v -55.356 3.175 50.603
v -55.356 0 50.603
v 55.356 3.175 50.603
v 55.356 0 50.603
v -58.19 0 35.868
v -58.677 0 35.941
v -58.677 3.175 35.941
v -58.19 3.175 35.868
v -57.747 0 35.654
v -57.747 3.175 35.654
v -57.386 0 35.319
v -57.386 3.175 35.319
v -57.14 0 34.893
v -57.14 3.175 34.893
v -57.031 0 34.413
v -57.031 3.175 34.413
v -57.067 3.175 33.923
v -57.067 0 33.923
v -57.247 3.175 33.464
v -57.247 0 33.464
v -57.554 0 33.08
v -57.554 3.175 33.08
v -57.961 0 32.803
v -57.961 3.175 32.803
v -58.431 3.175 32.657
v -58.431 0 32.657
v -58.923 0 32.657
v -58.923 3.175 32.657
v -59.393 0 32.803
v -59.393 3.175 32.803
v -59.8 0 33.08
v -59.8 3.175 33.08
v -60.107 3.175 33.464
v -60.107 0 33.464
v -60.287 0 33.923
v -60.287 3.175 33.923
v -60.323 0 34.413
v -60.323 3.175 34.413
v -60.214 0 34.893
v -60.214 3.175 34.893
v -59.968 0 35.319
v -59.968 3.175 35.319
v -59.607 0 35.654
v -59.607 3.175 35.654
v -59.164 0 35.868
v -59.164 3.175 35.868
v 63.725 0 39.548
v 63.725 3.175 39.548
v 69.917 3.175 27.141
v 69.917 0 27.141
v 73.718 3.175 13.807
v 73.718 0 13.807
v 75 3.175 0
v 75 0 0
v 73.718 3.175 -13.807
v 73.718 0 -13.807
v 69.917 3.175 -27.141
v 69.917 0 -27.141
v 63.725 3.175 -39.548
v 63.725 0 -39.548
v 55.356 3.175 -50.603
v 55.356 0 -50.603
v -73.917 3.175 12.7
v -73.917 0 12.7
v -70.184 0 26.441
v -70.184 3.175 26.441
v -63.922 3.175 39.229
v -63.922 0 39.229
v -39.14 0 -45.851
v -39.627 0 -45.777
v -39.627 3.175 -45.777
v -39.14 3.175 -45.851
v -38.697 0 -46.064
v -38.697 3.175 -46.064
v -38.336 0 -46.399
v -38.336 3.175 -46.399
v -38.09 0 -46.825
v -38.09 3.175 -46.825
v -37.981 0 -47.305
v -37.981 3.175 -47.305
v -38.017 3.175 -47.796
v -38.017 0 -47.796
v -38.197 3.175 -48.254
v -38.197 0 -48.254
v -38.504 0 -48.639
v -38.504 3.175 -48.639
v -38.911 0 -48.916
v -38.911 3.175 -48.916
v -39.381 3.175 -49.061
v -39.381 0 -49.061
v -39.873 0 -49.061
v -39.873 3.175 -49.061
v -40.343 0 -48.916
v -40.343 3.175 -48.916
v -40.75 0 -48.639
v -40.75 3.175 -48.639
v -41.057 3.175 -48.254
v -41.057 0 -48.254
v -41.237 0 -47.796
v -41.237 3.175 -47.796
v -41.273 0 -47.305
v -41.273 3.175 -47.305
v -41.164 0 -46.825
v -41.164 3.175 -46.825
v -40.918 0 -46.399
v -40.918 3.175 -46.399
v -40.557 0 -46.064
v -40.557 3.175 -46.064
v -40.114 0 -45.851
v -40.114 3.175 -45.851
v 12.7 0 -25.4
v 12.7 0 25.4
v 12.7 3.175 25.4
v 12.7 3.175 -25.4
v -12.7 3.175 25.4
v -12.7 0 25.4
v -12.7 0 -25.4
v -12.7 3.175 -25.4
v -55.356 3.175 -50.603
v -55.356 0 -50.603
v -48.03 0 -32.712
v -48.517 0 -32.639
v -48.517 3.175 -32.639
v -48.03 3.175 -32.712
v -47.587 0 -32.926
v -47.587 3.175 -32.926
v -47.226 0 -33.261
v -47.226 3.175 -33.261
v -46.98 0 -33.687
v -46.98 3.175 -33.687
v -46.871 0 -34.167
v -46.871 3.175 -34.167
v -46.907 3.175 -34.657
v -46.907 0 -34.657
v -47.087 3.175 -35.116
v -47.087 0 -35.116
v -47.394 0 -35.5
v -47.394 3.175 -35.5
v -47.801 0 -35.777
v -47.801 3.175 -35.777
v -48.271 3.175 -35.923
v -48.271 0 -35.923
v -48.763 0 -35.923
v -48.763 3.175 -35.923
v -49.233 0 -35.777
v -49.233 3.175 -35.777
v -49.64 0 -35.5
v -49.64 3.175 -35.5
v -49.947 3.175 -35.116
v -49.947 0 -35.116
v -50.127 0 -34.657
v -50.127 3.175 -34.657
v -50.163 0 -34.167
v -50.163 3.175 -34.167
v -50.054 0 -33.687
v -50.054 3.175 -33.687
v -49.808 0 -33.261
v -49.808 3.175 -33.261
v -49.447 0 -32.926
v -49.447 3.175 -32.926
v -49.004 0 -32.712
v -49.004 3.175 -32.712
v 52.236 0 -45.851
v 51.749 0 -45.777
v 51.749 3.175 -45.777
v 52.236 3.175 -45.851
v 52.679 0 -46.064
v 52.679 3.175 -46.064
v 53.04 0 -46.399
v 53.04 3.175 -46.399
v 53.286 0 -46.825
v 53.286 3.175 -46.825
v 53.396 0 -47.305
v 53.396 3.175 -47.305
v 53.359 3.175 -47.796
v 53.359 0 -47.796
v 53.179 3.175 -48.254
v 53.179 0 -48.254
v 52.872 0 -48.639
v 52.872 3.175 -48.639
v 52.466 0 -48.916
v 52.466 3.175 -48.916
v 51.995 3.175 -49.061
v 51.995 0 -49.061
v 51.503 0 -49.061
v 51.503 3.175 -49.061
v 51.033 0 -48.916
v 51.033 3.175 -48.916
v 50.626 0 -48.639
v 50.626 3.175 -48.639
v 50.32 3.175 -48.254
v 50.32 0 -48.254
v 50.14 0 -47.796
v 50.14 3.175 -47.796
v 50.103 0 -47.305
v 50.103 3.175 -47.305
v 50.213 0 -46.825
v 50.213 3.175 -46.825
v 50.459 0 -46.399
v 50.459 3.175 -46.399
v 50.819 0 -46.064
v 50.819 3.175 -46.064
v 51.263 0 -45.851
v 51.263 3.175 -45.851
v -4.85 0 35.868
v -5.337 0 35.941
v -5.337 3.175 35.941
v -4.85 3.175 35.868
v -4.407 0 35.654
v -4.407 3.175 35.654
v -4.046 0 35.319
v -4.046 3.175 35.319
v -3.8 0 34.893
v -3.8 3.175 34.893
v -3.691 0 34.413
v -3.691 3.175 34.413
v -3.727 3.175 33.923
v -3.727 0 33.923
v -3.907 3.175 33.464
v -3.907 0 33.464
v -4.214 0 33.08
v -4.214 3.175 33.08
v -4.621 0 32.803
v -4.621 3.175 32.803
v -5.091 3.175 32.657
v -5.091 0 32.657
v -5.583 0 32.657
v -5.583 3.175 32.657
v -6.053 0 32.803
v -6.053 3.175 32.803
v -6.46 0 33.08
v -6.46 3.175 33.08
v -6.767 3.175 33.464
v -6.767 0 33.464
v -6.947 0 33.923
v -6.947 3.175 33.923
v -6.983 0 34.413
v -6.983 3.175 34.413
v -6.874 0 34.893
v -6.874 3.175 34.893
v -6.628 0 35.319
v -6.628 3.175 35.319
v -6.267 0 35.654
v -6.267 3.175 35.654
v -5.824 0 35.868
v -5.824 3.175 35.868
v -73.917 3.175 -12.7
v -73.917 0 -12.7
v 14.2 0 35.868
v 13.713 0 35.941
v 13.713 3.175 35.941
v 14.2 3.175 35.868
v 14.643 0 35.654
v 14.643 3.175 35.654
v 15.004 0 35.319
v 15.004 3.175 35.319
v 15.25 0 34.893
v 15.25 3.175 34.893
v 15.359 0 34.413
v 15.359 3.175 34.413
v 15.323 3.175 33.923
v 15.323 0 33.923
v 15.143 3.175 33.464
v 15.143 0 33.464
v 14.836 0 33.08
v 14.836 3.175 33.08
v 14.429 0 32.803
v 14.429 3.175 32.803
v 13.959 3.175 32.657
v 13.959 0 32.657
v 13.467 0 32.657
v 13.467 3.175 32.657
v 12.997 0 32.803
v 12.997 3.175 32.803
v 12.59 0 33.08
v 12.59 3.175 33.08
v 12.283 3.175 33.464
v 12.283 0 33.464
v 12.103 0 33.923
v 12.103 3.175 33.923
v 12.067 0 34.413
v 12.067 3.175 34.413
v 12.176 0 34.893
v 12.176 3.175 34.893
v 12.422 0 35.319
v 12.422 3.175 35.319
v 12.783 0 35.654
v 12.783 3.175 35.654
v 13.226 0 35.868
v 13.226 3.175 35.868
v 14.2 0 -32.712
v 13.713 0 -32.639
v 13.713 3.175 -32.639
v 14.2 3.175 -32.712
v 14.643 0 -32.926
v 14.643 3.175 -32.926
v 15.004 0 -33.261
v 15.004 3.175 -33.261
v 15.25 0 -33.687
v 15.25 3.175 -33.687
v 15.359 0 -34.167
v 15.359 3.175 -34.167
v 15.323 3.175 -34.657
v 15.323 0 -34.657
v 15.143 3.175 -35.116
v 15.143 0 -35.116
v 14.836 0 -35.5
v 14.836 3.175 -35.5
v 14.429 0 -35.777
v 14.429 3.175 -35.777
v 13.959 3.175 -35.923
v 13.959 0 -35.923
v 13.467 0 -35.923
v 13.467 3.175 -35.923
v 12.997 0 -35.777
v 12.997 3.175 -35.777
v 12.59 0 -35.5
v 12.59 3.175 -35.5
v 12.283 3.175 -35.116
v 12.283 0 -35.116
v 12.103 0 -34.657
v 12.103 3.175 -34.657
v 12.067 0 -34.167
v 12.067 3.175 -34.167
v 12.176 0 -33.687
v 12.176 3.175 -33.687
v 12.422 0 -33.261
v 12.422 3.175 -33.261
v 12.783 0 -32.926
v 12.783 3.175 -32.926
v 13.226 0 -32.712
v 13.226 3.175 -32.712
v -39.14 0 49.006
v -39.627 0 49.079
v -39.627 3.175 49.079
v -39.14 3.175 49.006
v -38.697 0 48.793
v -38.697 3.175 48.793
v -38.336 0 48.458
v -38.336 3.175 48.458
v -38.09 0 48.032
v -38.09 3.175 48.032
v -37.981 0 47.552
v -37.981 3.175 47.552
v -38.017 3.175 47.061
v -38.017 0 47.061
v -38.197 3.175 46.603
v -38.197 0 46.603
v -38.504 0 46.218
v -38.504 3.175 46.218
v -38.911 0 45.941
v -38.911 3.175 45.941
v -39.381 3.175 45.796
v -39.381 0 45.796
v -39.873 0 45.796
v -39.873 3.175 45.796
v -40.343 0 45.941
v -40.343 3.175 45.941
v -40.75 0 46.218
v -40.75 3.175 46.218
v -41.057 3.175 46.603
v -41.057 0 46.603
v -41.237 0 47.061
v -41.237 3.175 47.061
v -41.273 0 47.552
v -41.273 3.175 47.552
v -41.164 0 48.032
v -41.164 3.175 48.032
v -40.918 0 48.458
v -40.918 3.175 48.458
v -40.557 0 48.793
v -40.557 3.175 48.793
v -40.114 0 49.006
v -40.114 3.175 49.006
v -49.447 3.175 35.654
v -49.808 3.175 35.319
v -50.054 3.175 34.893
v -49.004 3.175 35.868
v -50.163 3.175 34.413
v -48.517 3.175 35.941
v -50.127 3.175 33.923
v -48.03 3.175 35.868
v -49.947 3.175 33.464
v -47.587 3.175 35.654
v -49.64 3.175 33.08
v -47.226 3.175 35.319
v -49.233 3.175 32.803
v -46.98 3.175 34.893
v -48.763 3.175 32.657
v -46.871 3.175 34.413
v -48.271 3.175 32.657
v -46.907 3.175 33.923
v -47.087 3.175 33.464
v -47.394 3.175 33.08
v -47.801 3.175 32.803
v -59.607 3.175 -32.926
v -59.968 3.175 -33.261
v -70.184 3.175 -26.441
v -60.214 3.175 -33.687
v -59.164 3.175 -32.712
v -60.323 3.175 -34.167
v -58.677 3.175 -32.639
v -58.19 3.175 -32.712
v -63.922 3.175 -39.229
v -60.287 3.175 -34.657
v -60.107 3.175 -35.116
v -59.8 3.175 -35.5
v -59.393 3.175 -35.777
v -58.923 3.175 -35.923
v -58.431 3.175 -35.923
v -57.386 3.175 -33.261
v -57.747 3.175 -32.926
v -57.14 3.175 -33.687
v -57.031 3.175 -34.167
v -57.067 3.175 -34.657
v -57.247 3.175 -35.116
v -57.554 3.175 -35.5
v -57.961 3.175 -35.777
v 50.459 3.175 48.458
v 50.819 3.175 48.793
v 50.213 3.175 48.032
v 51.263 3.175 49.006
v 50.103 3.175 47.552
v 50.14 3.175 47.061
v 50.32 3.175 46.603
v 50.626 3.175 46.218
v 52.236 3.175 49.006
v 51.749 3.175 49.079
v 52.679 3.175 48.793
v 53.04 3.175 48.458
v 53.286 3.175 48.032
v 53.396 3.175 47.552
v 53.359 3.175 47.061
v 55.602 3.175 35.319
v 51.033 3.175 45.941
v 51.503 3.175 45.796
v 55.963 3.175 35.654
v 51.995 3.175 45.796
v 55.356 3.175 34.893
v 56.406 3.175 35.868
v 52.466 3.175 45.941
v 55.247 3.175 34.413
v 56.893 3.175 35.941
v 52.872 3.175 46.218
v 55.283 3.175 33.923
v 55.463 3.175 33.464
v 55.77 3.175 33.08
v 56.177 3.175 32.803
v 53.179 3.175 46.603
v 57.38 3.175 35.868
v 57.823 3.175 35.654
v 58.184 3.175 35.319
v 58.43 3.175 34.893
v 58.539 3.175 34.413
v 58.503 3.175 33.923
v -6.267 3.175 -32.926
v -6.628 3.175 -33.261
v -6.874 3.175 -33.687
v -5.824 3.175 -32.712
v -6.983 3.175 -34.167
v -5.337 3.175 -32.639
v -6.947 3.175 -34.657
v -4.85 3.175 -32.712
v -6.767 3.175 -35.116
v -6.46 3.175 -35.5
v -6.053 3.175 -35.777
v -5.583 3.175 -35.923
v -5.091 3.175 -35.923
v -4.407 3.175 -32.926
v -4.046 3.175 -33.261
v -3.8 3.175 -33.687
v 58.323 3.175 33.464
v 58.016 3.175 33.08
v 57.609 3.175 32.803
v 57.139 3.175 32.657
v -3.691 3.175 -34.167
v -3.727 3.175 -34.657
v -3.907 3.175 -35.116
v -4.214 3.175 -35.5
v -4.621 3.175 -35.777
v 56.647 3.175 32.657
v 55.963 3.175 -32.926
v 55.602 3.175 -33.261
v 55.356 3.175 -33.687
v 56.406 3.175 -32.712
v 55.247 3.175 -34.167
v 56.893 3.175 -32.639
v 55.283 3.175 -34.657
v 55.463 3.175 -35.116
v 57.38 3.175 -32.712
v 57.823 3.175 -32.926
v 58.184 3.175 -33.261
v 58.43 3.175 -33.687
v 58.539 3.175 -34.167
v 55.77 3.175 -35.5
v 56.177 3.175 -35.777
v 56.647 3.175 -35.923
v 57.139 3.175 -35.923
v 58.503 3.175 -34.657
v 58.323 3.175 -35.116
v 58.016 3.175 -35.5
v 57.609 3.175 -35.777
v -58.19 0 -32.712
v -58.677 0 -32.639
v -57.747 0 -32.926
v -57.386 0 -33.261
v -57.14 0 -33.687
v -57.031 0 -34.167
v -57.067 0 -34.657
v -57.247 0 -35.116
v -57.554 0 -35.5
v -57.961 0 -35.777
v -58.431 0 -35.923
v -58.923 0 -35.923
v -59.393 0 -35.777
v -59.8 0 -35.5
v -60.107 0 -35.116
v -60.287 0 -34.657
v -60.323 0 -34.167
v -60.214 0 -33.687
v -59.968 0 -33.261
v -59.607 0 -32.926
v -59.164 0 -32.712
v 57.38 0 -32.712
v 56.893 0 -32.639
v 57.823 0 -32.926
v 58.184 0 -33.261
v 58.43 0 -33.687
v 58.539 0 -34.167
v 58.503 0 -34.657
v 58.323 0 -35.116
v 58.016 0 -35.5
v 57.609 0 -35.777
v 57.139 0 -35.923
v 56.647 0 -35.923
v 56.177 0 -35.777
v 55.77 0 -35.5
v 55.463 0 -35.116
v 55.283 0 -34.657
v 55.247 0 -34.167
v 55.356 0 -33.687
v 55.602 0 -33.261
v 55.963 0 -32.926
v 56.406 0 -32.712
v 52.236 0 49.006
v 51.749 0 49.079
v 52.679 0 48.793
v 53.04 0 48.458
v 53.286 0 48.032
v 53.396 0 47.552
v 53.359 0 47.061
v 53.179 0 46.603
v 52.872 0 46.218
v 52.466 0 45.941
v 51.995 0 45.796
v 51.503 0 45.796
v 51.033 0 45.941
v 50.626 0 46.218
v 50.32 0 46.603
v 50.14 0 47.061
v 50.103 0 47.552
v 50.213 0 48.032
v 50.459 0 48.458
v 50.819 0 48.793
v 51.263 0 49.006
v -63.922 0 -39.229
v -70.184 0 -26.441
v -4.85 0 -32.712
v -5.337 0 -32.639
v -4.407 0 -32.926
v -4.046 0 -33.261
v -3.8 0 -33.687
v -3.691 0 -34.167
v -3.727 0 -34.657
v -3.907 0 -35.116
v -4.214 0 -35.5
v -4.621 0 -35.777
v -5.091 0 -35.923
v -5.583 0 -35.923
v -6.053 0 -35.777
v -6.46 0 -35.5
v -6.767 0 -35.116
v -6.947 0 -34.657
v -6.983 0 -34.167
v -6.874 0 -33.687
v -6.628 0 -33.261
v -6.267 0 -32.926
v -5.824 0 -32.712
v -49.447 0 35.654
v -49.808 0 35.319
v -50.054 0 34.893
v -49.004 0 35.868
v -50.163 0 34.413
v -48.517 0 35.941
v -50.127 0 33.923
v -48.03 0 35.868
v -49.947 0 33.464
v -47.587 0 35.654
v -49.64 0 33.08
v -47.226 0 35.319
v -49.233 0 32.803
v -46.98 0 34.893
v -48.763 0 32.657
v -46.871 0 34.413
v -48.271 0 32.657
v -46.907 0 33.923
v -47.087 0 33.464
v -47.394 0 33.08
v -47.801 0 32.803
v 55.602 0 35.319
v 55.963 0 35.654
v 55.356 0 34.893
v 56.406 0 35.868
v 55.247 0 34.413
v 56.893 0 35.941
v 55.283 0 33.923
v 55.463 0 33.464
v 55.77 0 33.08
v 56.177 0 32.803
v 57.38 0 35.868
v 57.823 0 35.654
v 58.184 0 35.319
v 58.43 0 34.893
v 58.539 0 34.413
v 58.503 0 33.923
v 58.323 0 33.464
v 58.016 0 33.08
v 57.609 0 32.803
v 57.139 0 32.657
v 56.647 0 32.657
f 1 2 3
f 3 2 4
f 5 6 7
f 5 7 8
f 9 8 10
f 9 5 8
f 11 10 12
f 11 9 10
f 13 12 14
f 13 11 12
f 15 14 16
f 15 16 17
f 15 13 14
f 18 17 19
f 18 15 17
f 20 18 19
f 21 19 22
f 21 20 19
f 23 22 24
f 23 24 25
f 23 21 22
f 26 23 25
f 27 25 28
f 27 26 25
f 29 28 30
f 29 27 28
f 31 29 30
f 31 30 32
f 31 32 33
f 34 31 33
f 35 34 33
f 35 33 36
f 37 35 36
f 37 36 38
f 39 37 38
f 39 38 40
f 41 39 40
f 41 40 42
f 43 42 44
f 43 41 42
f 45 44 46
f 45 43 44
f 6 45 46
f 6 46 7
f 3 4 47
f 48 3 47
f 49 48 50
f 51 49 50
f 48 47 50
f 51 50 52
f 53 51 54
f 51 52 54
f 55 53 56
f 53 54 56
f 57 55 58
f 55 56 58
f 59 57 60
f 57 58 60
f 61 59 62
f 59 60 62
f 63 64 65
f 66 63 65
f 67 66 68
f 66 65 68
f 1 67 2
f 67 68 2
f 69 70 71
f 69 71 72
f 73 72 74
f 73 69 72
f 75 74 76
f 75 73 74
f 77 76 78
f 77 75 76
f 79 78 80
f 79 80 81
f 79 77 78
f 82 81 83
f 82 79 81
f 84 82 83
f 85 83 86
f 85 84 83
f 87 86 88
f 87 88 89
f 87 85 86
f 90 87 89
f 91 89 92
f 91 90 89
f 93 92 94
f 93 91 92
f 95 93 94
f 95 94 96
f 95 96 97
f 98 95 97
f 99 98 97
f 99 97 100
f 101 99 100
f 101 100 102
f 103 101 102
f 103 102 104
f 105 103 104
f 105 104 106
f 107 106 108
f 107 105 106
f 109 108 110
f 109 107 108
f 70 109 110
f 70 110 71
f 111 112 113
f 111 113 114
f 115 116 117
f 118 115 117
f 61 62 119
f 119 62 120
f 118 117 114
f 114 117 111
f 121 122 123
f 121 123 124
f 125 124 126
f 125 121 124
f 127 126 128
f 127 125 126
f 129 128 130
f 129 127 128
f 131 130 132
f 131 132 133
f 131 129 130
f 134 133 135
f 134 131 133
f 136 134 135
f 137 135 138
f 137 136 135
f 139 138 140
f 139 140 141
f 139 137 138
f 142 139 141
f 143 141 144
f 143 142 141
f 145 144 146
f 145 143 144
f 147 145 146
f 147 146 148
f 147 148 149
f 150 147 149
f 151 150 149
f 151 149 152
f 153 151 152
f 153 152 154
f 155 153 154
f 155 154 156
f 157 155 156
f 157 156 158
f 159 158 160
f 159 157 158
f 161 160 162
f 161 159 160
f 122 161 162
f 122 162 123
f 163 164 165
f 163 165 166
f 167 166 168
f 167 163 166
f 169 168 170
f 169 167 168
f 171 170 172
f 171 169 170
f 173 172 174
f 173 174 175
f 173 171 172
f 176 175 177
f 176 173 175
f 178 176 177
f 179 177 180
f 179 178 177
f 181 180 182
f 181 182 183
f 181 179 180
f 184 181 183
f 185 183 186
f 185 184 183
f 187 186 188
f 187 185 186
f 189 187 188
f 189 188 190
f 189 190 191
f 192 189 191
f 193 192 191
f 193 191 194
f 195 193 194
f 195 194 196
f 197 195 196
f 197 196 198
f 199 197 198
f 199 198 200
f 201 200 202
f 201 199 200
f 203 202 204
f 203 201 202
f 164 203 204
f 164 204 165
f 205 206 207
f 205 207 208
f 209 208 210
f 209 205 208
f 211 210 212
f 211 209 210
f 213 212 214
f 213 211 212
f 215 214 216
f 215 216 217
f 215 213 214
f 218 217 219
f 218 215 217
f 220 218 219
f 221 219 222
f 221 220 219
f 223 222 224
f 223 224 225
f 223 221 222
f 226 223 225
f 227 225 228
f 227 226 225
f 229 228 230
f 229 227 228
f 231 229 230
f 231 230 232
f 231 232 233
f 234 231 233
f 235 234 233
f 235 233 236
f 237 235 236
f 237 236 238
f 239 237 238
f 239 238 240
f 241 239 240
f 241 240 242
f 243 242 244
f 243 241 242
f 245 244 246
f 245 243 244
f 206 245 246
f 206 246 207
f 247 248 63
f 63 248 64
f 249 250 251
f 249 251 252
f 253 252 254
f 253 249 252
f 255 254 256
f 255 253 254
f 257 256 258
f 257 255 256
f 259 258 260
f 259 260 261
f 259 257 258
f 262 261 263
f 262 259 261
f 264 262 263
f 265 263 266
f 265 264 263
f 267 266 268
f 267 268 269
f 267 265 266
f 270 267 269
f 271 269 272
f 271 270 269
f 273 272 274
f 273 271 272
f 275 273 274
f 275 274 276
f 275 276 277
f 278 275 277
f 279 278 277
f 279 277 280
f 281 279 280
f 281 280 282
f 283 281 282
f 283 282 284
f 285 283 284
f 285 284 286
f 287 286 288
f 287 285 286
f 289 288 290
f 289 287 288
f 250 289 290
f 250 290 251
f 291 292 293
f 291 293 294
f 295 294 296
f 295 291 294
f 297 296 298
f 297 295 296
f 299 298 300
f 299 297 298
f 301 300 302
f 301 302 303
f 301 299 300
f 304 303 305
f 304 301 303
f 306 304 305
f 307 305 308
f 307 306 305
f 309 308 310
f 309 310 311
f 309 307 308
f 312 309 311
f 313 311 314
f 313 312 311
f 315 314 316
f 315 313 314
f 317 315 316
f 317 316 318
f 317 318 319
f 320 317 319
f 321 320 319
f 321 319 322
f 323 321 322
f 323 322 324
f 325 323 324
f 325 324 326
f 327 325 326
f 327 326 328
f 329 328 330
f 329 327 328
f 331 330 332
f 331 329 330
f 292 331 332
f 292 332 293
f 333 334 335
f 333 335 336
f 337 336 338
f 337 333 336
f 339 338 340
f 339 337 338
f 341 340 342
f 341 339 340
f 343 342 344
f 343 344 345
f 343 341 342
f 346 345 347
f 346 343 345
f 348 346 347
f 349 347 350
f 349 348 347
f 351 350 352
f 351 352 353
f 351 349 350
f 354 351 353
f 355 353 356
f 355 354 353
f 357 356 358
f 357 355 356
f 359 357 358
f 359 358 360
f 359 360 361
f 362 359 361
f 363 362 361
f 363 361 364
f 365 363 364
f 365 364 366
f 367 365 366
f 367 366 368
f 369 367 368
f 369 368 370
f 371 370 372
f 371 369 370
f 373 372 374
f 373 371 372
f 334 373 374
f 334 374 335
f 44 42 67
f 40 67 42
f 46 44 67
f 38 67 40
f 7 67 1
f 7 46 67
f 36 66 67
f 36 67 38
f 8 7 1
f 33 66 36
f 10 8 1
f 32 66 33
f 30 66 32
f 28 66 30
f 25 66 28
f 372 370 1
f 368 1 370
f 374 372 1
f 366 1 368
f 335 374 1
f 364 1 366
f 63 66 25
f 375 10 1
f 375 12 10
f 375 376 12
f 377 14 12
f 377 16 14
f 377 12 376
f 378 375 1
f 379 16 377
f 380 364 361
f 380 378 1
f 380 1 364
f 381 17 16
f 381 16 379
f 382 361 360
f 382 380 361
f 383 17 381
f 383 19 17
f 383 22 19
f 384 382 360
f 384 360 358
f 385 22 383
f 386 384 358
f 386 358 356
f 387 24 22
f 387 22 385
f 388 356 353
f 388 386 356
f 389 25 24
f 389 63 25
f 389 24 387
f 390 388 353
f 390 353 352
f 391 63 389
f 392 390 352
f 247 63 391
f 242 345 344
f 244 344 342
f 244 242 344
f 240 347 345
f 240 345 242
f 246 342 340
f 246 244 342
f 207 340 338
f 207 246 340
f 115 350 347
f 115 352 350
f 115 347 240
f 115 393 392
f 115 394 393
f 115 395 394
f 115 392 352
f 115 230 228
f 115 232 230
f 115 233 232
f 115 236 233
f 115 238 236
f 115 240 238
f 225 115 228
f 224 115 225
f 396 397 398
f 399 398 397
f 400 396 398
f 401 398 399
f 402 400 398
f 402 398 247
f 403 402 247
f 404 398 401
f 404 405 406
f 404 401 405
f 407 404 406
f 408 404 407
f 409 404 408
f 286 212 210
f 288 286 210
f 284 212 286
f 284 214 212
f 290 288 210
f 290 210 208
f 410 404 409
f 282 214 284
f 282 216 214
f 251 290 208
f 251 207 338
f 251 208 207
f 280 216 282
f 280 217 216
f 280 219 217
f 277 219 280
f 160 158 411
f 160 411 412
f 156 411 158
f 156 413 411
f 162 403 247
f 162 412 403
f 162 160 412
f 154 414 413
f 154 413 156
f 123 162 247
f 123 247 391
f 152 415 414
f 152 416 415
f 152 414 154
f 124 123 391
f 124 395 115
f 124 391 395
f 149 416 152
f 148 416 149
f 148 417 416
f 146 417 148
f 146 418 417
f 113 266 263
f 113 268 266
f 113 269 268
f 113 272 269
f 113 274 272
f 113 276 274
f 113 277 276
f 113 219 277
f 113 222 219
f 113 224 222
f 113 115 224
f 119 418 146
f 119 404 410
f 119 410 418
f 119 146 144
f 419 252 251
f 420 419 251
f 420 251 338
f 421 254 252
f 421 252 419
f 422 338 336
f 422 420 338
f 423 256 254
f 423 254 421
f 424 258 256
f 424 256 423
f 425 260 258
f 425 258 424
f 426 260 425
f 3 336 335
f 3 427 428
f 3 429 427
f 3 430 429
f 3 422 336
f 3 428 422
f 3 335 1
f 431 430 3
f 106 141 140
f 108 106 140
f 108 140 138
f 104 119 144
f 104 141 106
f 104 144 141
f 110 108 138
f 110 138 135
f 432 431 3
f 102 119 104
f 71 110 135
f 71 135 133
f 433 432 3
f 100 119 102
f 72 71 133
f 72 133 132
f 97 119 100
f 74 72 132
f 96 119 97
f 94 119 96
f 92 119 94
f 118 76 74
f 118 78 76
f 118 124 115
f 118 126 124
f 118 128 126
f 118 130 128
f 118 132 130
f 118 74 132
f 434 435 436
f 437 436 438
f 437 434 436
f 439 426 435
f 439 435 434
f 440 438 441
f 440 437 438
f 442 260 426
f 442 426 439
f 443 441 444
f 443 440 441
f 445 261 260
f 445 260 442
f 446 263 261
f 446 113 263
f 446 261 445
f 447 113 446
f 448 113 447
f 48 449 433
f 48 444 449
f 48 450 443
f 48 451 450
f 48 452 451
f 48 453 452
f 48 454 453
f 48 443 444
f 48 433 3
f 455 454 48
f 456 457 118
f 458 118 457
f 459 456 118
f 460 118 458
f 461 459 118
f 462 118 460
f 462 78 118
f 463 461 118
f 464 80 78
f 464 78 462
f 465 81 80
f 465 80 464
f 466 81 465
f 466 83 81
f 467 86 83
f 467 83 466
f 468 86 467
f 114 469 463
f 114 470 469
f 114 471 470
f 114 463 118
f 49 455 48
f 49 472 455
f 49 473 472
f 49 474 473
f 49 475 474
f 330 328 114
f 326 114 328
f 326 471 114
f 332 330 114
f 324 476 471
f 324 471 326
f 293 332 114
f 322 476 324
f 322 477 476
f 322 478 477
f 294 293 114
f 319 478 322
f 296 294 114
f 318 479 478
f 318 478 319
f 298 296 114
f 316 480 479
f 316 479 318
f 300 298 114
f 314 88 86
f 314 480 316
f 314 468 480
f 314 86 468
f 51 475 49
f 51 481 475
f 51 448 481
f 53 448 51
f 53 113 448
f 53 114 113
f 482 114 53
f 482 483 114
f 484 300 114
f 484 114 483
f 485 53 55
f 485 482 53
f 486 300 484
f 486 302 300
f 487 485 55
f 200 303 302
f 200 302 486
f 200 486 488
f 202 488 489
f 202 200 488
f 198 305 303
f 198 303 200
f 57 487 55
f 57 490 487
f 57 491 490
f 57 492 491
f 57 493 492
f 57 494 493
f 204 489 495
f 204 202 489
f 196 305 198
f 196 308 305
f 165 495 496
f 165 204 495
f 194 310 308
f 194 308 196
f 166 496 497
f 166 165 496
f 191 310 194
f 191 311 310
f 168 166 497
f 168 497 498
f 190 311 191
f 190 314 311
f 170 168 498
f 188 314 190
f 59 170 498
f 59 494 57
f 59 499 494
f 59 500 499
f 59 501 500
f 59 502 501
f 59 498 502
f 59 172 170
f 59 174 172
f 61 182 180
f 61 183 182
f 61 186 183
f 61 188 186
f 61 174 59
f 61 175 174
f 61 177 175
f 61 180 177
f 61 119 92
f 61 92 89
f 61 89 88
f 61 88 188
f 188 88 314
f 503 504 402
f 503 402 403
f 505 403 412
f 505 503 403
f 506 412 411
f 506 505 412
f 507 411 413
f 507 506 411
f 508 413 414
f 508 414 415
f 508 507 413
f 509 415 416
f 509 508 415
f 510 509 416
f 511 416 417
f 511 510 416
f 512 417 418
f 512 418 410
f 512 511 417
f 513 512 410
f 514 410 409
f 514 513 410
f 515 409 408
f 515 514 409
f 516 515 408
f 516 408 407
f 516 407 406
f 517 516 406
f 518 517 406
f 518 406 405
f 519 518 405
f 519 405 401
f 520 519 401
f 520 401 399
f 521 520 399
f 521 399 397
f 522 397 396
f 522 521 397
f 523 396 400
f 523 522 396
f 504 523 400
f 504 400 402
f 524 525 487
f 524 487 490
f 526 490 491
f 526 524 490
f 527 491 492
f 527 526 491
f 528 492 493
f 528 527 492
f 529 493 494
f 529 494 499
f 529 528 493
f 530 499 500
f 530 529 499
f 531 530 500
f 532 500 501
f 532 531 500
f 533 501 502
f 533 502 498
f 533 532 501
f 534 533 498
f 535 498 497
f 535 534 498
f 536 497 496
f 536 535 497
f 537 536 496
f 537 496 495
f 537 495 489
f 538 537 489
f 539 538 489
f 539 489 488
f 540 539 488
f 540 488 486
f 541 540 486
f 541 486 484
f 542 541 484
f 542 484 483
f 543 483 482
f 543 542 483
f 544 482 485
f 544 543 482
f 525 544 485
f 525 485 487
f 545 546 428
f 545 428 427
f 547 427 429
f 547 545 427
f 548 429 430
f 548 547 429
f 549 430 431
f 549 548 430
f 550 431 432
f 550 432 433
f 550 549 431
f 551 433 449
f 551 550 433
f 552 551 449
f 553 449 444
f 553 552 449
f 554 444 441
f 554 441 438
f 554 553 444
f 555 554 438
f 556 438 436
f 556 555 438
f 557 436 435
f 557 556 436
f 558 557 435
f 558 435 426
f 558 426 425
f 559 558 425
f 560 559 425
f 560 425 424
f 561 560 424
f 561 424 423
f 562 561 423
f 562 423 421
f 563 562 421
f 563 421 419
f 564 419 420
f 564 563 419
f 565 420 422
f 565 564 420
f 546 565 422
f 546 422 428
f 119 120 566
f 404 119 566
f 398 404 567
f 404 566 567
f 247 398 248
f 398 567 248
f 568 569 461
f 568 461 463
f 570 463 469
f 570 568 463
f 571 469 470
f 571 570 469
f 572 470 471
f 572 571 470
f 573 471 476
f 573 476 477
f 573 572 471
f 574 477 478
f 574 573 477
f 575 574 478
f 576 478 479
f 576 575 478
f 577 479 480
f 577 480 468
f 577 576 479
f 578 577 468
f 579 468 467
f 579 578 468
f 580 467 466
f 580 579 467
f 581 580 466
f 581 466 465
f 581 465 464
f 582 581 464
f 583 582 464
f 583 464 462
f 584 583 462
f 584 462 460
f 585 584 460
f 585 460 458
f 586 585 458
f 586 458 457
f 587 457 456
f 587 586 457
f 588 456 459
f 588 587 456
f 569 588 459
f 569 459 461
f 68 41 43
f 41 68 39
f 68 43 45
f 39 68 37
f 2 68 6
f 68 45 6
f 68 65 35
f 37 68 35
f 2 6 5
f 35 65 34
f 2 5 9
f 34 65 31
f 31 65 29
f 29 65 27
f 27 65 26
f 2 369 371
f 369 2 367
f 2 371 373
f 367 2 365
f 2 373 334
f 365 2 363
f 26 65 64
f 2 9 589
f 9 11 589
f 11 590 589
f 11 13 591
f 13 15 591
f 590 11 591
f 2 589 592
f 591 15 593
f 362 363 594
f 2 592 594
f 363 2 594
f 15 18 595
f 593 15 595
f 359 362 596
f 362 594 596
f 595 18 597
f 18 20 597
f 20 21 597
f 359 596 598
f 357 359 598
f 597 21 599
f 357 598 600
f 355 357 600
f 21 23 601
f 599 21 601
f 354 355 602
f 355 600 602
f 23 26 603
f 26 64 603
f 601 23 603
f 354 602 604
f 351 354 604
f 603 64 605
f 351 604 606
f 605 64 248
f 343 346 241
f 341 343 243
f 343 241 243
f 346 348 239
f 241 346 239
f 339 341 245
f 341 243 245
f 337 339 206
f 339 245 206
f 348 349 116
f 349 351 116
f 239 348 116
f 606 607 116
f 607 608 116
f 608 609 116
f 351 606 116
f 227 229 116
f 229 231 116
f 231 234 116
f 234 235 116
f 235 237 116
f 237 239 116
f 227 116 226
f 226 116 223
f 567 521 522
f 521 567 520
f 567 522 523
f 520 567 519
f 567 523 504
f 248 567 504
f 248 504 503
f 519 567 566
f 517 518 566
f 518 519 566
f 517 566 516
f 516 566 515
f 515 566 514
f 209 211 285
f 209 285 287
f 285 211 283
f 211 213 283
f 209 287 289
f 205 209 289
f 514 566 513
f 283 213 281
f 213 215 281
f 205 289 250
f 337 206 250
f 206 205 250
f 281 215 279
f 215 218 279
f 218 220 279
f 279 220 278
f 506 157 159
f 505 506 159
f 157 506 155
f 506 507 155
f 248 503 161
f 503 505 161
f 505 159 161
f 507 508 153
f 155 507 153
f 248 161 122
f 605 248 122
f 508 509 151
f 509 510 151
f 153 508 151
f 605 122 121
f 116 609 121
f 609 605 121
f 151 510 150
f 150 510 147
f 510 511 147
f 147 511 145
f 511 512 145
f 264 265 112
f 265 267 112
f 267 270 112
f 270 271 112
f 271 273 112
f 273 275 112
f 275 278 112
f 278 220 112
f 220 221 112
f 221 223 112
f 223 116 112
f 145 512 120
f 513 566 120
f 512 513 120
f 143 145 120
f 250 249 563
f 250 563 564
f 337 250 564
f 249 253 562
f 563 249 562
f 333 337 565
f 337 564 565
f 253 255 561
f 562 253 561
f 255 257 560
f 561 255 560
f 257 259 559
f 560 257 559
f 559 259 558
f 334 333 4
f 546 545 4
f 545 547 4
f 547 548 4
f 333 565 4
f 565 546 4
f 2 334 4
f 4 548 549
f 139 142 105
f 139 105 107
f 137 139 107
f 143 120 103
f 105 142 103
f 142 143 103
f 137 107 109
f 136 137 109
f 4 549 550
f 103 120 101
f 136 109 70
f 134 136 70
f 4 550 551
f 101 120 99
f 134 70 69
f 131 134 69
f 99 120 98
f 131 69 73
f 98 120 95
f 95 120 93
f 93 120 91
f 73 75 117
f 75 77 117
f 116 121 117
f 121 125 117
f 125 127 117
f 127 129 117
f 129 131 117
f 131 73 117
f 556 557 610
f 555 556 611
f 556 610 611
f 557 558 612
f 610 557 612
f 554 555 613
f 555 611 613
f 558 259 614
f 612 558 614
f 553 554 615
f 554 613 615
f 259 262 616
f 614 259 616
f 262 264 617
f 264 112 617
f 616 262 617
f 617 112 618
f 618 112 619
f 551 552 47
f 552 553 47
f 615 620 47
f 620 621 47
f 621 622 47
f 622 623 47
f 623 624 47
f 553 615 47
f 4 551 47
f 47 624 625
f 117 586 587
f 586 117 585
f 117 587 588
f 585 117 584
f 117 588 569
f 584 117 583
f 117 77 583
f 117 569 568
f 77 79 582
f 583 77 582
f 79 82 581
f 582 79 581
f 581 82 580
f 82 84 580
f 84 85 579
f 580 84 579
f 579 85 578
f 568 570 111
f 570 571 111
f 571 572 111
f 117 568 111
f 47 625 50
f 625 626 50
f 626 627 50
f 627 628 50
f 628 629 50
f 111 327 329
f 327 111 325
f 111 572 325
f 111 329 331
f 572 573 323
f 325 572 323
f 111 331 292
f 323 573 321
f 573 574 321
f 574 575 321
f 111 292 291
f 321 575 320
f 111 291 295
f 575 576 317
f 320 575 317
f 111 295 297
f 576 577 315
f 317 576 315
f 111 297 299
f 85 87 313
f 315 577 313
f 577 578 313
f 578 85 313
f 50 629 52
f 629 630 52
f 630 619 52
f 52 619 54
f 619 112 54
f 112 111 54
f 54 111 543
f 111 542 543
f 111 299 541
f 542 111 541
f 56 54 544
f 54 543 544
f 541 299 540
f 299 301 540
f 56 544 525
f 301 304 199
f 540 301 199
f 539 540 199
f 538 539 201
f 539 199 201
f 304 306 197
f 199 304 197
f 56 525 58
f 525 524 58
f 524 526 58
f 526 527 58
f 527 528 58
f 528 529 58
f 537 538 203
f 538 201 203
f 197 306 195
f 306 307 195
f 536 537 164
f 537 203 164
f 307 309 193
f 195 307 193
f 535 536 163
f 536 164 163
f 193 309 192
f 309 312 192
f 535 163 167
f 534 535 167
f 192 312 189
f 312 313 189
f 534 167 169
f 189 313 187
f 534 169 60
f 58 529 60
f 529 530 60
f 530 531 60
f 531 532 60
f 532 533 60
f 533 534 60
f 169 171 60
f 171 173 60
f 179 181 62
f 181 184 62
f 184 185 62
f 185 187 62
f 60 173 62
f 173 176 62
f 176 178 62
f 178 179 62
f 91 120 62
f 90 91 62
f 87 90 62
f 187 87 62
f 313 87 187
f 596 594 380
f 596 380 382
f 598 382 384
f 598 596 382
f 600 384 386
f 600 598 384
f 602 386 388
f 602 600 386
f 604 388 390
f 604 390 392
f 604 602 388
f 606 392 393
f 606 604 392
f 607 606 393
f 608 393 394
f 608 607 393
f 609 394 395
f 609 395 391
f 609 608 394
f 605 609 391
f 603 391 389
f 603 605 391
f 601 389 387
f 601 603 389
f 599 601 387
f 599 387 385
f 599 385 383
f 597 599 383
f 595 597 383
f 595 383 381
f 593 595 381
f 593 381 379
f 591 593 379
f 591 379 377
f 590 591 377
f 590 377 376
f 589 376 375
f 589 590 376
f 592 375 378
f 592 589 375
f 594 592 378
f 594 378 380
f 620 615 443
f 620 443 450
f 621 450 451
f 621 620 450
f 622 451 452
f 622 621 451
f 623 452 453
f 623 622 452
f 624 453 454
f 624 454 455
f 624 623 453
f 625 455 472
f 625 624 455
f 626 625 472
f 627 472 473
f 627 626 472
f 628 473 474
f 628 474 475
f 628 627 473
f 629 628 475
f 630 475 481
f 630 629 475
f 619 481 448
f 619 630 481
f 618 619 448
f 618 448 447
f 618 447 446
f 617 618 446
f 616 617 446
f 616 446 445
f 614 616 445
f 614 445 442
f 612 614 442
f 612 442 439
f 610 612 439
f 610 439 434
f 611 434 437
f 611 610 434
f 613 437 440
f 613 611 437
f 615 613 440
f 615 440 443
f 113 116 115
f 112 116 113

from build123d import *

# Parameters (mm, degrees)
SKETCH1_R           = 1.651
SKETCH1_W           = 25.4
SKETCH1_H           = 50.8
BOSS_EXTRUDE1_DEPTH = 3.175


with BuildPart() as part:
    # Sketch1 → Boss-Extrude1 (new body)
    with BuildSketch(Plane(origin=(0, 0, 0), x_dir=(1, 0, 0), z_dir=(0, 1, 0))):
        with BuildLine():
            Line((-73.916912814, 12.7), (-73.916912814, -12.7))
            ThreePointArc((-73.916912814, -12.7), (-67.357563081, -32.984218889), (-55.35602635, -50.603461806))
            Line((-55.35602635, -50.603461806), (55.35602635, -50.603461806))
            ThreePointArc((55.35602635, -50.603461806), (75, 0), (55.35602635, 50.603461806))
            Line((55.35602635, 50.603461806), (-55.35602635, 50.603461806))
            ThreePointArc((-55.35602635, 50.603461806), (-67.357563081, 32.984218889), (-73.916912814, 12.7))
        make_face()
        with Locations(Location((13.713087186, 34.29, 0), (0, 0, 270))):
            Circle(SKETCH1_R, mode=Mode.SUBTRACT)
        with Locations(Location((-58.676912814, -34.29, 0), (0, 0, 270))):
            Circle(SKETCH1_R, mode=Mode.SUBTRACT)
        with Locations(Location((-58.676912814, 34.29, 0), (0, 0, 270))):
            Circle(SKETCH1_R, mode=Mode.SUBTRACT)
        with Locations(Location((-39.626912814, 47.428461806, 0), (0, 0, 270))):
            Circle(SKETCH1_R, mode=Mode.SUBTRACT)
        with Locations(Location((51.749406285, 47.428461806, 0), (0, 0, 270))):
            Circle(SKETCH1_R, mode=Mode.SUBTRACT)
        with Locations(Location((-39.626912814, -47.428461806, 0), (0, 0, 270))):
            Circle(SKETCH1_R, mode=Mode.SUBTRACT)
        with Locations(Location((51.749406285, -47.428461806, 0), (0, 0, 270))):
            Circle(SKETCH1_R, mode=Mode.SUBTRACT)
        with Locations(Location((56.893087186, 34.29, 0), (0, 0, 270))):
            Circle(SKETCH1_R, mode=Mode.SUBTRACT)
        with Locations(Location((-48.516912814, 34.29, 0), (0, 0, 270))):
            Circle(SKETCH1_R, mode=Mode.SUBTRACT)
        with Locations(Location((-5.336912814, 34.29, 0), (0, 0, 270))):
            Circle(SKETCH1_R, mode=Mode.SUBTRACT)
        with Locations(Location((-5.336912814, -34.29, 0), (0, 0, 270))):
            Circle(SKETCH1_R, mode=Mode.SUBTRACT)
        with Locations(Location((-48.516912814, -34.29, 0), (0, 0, 270))):
            Circle(SKETCH1_R, mode=Mode.SUBTRACT)
        with Locations(Location((13.713087186, -34.29, 0), (0, 0, 270))):
            Circle(SKETCH1_R, mode=Mode.SUBTRACT)
        with Locations(Location((56.893087186, -34.29, 0), (0, 0, 270))):
            Circle(SKETCH1_R, mode=Mode.SUBTRACT)
        Rectangle(SKETCH1_W, SKETCH1_H, mode=Mode.SUBTRACT)
    extrude(amount=BOSS_EXTRUDE1_DEPTH)


solid = part.part
